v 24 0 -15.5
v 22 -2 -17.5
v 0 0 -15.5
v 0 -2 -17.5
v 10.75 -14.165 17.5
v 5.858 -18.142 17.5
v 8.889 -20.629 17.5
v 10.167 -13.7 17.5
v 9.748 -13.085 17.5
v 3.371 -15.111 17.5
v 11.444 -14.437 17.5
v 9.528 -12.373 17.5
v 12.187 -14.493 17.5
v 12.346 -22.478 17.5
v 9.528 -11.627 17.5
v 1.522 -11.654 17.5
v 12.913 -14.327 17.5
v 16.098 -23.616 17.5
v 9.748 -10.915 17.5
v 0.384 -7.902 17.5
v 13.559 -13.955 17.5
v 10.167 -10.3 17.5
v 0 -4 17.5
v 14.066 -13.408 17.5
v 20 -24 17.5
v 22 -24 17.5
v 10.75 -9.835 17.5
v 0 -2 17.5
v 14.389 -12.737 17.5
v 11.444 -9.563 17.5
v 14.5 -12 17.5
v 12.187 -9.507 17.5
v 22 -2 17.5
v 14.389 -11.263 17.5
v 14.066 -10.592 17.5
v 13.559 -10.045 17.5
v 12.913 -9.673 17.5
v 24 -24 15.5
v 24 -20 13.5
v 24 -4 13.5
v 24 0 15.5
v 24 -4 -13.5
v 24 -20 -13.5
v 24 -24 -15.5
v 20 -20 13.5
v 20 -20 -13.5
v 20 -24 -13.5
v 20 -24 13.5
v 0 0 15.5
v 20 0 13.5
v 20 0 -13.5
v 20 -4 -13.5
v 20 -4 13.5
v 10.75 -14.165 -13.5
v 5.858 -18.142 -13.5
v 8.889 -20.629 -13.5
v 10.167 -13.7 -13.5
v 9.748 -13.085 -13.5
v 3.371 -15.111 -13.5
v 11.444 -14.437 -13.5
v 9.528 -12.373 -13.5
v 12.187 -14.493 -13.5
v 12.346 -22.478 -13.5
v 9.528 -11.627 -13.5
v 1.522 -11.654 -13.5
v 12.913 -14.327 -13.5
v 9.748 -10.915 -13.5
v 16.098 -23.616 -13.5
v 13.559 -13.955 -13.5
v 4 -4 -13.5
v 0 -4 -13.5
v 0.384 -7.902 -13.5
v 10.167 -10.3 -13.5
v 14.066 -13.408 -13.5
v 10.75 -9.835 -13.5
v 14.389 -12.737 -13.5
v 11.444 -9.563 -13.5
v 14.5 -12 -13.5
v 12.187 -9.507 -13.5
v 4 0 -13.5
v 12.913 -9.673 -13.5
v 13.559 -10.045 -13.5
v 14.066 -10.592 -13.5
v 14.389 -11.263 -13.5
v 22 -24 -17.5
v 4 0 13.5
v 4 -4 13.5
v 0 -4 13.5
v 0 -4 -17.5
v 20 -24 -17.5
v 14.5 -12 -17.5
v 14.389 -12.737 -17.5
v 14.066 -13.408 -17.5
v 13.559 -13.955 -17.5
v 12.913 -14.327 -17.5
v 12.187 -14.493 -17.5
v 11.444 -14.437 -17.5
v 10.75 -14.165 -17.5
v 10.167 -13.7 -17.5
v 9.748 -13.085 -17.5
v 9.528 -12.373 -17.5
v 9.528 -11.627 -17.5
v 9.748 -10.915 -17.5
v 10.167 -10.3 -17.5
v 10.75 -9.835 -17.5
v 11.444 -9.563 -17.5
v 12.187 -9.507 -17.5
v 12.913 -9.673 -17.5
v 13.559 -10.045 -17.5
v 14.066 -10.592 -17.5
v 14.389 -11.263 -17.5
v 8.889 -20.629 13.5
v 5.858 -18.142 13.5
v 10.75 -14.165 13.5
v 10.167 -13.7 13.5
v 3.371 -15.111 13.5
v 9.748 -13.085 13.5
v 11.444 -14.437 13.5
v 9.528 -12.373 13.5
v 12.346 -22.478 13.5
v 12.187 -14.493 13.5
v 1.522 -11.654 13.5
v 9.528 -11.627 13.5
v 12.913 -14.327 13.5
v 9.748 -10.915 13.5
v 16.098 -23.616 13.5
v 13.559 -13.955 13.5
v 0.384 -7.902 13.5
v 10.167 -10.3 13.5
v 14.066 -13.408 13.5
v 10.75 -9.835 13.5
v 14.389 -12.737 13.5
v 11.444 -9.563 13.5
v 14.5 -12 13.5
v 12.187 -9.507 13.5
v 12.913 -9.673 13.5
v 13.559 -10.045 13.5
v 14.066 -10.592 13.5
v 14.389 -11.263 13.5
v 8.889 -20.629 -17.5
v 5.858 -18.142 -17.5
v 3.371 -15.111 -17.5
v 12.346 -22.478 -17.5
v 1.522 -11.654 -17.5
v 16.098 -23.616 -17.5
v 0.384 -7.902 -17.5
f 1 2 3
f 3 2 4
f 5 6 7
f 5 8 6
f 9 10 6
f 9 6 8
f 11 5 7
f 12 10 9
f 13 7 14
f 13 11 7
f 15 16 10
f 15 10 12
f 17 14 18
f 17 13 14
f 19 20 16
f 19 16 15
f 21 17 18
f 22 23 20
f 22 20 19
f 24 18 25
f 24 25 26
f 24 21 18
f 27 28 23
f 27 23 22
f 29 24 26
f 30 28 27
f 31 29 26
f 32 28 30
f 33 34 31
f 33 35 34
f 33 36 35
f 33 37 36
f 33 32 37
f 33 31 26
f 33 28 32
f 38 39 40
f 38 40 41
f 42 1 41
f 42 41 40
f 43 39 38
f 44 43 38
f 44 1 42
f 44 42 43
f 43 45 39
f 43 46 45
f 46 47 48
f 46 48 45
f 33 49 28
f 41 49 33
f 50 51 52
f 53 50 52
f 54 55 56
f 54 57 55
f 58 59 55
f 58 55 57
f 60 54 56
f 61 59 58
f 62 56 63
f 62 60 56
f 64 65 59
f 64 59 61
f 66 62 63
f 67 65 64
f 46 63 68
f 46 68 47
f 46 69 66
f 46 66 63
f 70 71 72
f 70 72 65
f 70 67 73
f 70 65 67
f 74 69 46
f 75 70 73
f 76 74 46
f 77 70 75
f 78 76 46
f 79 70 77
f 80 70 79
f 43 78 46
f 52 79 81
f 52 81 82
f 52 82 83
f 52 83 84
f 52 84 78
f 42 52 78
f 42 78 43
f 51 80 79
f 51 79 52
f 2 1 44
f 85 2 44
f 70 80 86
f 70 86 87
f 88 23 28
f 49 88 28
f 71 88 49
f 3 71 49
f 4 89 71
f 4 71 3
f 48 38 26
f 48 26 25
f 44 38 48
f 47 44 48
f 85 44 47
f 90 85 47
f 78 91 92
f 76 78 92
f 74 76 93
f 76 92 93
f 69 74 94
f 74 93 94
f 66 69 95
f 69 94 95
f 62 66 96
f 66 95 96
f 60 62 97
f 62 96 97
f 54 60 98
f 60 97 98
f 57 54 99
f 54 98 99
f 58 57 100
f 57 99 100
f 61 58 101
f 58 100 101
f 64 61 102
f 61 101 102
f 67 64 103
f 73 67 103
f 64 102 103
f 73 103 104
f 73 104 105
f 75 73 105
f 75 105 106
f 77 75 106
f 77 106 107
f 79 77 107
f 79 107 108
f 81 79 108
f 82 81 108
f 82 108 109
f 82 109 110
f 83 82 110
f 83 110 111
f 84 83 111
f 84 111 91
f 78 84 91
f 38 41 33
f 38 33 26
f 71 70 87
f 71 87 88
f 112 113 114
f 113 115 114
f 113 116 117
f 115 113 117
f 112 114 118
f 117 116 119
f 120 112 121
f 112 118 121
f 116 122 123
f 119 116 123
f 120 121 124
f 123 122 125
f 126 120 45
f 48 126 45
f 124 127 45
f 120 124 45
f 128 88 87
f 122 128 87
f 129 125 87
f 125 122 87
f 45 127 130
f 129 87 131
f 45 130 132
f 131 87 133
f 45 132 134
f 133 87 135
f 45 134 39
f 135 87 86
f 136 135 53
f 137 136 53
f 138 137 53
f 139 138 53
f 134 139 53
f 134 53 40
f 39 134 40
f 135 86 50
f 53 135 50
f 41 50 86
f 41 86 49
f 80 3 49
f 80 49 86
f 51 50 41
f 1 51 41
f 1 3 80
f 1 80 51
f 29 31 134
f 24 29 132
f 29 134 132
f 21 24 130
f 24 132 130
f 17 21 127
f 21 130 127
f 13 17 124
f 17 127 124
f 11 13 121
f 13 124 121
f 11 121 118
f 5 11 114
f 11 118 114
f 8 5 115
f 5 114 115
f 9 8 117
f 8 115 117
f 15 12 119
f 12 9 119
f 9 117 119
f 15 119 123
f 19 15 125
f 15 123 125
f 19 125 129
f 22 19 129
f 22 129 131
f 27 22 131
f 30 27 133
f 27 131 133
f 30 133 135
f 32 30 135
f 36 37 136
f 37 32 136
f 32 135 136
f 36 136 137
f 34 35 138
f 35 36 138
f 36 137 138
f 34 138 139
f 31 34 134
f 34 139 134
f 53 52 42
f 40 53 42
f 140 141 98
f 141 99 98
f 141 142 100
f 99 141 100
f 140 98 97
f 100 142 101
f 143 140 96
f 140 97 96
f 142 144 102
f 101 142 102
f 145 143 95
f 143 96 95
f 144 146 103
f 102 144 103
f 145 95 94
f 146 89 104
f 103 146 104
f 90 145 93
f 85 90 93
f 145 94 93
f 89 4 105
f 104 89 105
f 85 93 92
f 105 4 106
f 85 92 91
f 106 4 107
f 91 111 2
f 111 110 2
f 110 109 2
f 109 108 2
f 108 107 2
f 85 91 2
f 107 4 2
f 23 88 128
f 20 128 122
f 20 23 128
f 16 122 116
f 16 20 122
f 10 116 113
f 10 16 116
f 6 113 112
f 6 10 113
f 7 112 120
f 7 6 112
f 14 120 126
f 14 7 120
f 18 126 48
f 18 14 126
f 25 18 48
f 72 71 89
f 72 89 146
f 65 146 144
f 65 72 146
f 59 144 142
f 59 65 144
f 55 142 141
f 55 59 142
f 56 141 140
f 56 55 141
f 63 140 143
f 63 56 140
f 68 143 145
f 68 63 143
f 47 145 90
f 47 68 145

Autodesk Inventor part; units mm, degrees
ref_plane "YZ Plane" through (0, 0, 0) normal (1, 0, 0) x (0, 1, 0)
ref_plane "XZ Plane" through (0, 0, 0) normal (0, 1, 0) x (-1, 0, 0)
sketch "스케치1" plane through (0, 0, 0) normal (0, 0, 1) x (1, 0, 0)
  line L0 (0, 0) -> (24, 0)
  line L1 (24, 0) -> (24, -24)
  line L2 (24, -24) -> (0, -24)
  line L3 (0, -24) -> (0, 0)
  circle A0 centre (12, -12) radius 2.5
  dimension "d0" = 24
  dimension "d1" = 24
  dimension "d2" = 5
  dimension "d3" = 12
  dimension "d4" = 12
extrude "돌출1" add sketch "스케치1" along normal mid plane 35
fillet "모깎기1" radius 20 1 edges at (0, -24, 0)
chamfer "모따기1" distance 2 angle 45 4 edges at (12, 0, 17.5) (12, 0, -17.5) (24, -12, 17.5) (24, -12, -17.5)
ref_plane "작업 평면1" through (0, 0, 0) normal (0, 0, 1) x (1, 0, 0)
sketch "스케치2" plane through (0, 0, 0) normal (0, 0, 1) x (1, 0, 0)
  line L0 (24, -24) -> (24, 0) projected
  line L1 (24, 0) -> (20, 0)
  line L2 (20, 0) -> (20, -4)
  line L3 (20, -4) -> (24, -4)
  line L4 (24, -4) -> (24, 0)
  line L5 (0, 0) -> (0, -2) projected
  line L6 (0, 0) -> (4, 0)
  line L7 (4, 0) -> (4, -4)
  line L8 (4, -4) -> (0, -4)
  line L9 (0, -4) -> (0, 0)
  line L10 (22, -24) -> (24, -24) projected
  line L11 (24, -24) -> (20, -24)
  line L12 (20, -24) -> (20, -20)
  line L13 (20, -20) -> (24, -20)
  line L14 (24, -20) -> (24, -24)
  line L15 (22, -2) -> (24, 0) projected
  line L16 (24, 0) -> (0, 0)
  line L17 (0, 0) -> (0, -24)
  line L18 (0, -24) -> (24, -24)
  line L19 (24, -24) -> (24, 0)
  dimension "d11" = 4
  dimension "d12" = 4
  dimension "d13" = 4
  dimension "d14" = 4
  dimension "d15" = 4
extrude "돌출2" cut sketch "스케치2" along normal mid plane 27 contours L13 L12 L18 L17 L8 L7 L16 L2 L3 L0
properties part number "16-1"
